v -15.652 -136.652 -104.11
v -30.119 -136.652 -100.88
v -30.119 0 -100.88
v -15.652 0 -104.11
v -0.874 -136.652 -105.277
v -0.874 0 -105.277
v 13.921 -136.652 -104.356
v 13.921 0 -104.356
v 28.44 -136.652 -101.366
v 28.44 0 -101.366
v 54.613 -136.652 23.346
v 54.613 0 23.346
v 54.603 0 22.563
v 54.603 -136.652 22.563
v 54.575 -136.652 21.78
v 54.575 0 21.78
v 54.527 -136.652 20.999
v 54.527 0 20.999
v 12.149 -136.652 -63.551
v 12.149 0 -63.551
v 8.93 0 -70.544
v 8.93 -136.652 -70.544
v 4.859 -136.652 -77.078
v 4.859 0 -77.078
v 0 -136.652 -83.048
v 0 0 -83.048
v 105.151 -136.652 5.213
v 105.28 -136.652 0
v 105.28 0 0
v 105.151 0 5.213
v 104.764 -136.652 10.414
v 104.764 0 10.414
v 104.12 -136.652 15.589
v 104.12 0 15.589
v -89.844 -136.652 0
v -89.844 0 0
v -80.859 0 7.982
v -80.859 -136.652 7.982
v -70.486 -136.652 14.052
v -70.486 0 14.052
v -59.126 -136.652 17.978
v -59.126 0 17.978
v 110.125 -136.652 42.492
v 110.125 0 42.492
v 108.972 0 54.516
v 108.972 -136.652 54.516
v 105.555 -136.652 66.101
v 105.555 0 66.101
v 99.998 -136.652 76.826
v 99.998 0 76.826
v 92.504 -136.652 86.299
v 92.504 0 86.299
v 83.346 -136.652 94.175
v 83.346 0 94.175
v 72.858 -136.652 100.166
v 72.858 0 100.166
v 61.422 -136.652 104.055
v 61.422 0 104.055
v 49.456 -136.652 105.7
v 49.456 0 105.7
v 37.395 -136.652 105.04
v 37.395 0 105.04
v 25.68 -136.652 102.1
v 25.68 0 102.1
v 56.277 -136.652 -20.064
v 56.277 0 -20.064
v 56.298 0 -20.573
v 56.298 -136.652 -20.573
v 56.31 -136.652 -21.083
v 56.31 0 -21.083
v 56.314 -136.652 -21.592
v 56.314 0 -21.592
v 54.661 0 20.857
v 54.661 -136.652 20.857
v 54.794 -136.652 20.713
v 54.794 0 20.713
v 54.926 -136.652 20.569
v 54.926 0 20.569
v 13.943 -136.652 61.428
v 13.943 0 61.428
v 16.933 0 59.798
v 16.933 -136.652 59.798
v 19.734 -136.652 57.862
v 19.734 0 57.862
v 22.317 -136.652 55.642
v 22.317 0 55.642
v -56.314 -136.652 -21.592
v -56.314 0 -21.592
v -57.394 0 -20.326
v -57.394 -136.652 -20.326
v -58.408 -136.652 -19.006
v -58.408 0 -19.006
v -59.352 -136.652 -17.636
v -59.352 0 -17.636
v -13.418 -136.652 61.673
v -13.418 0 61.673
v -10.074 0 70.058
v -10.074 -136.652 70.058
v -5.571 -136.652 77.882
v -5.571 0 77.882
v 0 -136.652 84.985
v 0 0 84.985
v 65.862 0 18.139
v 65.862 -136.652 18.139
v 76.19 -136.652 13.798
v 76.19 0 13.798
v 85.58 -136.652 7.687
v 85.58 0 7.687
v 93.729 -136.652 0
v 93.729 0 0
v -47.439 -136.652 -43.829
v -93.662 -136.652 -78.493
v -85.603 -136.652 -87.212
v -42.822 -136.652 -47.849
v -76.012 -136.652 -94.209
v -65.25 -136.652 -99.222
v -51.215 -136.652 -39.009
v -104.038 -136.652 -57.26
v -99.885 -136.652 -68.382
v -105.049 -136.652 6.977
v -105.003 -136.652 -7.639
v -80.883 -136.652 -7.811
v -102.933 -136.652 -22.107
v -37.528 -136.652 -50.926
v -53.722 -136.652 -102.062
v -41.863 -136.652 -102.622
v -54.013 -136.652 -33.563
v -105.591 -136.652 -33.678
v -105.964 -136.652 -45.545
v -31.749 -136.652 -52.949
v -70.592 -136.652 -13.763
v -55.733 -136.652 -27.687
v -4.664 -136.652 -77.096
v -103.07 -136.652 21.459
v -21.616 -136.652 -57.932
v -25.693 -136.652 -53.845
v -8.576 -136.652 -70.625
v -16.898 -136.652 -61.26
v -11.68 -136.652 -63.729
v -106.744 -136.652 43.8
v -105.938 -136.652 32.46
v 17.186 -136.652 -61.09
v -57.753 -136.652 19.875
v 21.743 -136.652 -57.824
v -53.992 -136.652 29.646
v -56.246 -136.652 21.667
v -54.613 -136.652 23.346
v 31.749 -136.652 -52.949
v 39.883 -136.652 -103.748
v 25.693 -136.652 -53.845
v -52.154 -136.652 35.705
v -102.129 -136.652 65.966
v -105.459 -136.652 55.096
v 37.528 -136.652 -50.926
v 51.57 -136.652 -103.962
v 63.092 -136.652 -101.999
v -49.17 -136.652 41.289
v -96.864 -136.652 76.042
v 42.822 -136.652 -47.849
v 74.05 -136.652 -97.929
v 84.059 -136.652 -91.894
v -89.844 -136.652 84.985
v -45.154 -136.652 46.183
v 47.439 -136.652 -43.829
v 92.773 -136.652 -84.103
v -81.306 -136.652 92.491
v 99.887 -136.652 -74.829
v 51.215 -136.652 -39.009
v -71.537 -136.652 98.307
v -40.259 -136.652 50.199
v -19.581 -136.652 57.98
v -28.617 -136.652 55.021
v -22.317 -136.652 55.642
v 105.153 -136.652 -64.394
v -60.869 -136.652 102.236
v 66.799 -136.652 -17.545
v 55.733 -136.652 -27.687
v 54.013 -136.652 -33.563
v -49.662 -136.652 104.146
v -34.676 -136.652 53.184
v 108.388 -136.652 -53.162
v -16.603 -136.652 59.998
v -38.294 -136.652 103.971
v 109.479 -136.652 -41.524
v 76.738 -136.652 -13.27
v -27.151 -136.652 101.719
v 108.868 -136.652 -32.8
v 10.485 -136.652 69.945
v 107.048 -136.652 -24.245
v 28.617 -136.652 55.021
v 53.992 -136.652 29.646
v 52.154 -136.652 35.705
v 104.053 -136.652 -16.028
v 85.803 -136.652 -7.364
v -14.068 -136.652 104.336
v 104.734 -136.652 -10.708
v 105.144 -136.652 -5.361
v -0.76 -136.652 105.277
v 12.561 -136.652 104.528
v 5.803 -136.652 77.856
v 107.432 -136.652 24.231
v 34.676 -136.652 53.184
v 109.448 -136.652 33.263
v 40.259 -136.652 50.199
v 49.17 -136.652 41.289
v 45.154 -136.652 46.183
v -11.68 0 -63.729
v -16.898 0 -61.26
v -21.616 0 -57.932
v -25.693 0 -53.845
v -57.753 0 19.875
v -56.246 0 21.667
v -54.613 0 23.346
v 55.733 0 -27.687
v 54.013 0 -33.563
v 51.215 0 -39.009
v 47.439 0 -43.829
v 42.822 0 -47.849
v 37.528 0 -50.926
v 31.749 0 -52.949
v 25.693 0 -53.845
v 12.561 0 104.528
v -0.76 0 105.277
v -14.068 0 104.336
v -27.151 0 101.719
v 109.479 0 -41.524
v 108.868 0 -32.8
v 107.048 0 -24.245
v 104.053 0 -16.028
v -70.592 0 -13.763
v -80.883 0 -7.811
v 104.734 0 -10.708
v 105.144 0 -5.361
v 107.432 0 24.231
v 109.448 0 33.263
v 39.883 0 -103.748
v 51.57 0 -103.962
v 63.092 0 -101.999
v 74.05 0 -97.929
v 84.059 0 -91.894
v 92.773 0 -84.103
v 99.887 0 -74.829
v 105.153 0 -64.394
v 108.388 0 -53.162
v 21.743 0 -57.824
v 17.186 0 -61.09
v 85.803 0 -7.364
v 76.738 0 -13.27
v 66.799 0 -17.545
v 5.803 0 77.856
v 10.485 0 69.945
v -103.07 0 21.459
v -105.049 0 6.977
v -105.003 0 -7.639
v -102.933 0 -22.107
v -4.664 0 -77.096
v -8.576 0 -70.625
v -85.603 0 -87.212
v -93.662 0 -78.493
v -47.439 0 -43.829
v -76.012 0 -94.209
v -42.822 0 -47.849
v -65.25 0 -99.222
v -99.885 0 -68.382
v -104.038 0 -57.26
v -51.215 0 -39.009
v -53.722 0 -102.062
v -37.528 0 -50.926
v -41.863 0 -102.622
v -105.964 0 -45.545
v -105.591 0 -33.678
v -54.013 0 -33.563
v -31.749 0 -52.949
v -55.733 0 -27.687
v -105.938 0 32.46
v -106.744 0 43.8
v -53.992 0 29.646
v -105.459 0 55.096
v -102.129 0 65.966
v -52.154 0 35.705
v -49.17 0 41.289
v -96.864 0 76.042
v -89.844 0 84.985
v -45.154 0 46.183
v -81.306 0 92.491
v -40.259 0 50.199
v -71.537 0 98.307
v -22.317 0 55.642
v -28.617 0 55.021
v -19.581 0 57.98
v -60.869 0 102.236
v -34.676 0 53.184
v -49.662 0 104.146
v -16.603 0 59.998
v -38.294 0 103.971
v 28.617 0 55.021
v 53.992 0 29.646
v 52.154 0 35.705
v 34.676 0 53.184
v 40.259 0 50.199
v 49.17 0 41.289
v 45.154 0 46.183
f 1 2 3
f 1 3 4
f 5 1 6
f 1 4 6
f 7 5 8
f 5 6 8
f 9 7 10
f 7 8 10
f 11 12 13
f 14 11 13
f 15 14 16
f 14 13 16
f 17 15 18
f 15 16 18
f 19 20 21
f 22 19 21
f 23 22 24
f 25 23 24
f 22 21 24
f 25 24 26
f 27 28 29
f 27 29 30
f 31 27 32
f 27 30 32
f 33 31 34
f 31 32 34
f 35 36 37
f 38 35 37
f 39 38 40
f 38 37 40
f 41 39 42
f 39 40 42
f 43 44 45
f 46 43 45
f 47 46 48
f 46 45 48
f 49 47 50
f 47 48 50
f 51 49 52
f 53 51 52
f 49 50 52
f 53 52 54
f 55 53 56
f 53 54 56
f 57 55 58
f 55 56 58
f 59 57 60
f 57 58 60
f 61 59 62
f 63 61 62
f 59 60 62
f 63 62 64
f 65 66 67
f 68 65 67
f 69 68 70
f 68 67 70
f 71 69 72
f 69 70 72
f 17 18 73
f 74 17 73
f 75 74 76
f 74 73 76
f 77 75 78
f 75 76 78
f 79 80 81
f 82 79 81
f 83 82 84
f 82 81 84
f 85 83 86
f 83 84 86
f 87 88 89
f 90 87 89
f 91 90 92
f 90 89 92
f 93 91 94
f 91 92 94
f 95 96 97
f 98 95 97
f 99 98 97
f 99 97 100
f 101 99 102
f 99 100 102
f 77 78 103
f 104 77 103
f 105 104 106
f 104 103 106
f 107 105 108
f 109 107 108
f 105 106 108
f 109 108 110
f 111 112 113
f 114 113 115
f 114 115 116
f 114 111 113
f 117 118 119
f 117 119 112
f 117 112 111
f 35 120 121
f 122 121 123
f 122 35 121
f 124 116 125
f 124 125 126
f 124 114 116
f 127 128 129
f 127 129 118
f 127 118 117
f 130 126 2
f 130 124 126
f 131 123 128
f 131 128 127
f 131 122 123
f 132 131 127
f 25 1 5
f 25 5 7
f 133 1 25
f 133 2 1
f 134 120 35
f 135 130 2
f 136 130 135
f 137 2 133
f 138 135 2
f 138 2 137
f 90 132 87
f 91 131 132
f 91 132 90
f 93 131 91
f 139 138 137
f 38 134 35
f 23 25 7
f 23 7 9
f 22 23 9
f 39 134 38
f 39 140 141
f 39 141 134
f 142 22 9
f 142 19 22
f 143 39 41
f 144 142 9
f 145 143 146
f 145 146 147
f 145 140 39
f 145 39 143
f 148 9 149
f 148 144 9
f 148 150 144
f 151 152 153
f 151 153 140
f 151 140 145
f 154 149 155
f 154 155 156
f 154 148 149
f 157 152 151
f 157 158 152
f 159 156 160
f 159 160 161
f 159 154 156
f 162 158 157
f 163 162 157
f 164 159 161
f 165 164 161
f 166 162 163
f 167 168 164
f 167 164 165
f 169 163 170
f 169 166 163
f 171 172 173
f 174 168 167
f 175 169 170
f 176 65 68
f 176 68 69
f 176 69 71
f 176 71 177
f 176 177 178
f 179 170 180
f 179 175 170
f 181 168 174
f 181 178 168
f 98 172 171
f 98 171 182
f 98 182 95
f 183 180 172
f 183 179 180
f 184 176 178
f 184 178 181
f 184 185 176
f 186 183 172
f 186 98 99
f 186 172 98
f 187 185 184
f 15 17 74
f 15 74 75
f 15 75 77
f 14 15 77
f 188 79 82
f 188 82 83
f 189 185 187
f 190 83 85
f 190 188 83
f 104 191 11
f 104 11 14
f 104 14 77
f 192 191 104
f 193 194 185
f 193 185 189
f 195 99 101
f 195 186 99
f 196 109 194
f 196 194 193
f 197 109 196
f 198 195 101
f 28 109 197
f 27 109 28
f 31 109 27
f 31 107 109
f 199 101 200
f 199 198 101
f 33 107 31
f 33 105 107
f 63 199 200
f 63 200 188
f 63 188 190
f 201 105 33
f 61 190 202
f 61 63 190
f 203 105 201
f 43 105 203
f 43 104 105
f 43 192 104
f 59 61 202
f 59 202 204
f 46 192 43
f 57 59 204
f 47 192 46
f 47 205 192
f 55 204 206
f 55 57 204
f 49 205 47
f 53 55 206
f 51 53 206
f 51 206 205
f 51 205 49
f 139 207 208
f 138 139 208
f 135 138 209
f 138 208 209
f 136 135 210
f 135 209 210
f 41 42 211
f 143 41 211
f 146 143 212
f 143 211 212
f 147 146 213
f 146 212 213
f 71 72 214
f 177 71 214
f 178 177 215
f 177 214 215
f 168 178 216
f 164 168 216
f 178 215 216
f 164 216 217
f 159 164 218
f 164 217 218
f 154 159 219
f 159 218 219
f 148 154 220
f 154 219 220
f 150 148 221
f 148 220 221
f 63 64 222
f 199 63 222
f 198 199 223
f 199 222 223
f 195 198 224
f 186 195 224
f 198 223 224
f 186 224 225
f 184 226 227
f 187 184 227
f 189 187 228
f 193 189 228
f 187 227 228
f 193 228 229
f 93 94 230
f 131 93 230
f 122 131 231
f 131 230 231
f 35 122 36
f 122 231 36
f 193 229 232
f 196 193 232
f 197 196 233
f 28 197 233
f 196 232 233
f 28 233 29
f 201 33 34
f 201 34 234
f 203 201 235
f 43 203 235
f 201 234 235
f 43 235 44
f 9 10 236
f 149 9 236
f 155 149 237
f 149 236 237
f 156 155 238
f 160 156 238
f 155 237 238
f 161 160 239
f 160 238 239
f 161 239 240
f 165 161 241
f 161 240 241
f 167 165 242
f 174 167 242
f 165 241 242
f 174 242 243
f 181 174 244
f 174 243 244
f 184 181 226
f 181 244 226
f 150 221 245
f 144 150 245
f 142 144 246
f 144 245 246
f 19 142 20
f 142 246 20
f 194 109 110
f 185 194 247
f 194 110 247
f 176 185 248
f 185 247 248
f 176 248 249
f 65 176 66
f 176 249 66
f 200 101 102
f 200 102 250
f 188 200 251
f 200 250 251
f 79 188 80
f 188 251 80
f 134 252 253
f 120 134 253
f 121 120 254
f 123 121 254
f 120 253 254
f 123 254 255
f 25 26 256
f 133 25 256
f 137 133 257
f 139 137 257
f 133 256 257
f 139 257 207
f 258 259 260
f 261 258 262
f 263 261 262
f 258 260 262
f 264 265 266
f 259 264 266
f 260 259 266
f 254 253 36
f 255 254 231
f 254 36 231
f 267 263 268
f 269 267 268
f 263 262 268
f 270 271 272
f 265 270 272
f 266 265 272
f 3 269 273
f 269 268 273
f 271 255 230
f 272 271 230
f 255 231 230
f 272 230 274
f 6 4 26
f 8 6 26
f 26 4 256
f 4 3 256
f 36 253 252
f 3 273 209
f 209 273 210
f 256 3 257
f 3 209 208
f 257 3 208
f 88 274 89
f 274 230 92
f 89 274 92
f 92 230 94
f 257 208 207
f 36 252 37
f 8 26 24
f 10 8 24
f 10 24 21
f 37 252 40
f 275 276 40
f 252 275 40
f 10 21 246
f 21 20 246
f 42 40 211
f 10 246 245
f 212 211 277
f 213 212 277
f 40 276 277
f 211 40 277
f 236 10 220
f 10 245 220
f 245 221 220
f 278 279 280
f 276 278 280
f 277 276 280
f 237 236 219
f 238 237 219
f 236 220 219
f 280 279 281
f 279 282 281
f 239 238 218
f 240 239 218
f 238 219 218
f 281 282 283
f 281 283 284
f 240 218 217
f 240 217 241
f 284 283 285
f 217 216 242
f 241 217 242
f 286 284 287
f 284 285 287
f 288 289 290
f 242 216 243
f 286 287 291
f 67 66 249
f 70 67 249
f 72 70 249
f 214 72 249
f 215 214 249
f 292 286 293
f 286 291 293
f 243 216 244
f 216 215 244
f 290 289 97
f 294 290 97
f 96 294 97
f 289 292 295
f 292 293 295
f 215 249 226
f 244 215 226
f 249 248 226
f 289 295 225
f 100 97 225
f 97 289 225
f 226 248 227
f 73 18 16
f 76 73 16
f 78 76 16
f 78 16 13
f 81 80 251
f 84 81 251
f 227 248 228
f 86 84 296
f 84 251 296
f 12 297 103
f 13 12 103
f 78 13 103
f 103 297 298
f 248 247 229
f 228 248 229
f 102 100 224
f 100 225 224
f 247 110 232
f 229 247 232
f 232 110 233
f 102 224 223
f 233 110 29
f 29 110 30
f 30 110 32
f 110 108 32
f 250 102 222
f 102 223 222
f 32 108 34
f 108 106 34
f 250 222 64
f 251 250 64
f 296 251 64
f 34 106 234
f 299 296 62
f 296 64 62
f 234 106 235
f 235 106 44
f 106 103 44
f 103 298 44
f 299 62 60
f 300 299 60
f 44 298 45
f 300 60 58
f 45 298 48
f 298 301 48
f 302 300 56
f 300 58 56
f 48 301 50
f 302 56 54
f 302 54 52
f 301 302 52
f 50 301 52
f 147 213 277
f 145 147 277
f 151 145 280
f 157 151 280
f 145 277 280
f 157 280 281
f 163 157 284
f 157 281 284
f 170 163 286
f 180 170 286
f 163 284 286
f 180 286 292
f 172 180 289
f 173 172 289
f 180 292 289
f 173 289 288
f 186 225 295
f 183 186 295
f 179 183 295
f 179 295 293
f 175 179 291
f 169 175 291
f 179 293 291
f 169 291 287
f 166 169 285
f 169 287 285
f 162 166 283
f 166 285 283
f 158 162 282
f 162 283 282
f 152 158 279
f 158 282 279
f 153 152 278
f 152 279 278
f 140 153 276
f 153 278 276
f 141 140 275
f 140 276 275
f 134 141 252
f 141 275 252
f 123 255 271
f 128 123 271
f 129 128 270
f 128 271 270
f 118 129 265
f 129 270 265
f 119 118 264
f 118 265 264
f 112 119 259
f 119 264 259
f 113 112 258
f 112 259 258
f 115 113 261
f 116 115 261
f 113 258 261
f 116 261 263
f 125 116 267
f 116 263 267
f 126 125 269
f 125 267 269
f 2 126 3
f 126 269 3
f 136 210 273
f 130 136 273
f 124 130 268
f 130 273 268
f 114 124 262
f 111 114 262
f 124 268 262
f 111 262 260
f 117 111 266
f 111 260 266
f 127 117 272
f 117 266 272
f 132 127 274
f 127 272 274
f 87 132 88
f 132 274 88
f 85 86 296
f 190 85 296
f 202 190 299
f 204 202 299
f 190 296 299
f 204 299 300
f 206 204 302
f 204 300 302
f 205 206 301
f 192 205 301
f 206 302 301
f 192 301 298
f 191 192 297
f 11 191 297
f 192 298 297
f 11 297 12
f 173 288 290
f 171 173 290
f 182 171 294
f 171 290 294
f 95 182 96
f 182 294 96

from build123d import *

# Parameters (mm, degrees)
F1_DEPTH = 136.652


with BuildPart() as f1:
    # F0 (on Front) → F1 (new body)
    with BuildSketch(Plane.XZ):
        with BuildLine():
            ThreePointArc((54.527499783, 20.9989734618), (54.7276679048, 20.7850152309), (54.9257769328, 20.5691490349))
            ThreePointArc((54.9257769328, 20.5691490349), (76.1901987299, 13.7983190429), (93.7294736505, 0))
            ThreePointArc((93.7294736505, 0), (99.5048519531, 7.4078439529), (104.1196596047, 15.589206731))
            ThreePointArc((104.1196596047, 15.589206731), (77.9936820742, 70.717129744), (25.6797344721, 102.1003335947))
            ThreePointArc((25.6797344721, 102.1003335947), (11.7801687474, 95.1325271586), (0, 84.9848240614))
            ThreePointArc((0, 84.9848240614), (8.2911620822, 73.9876177792), (13.9425107784, 61.4279930793))
            ThreePointArc((13.9425107784, 61.4279930793), (18.3589234819, 58.8669445911), (22.3165845225, 55.6419500772))
            ThreePointArc((22.3165845225, 55.6419500772), (45.1535066394, 46.1825872135), (54.6128695031, 23.3456650966))
            ThreePointArc((54.6128695031, 23.3456650966), (54.5915200165, 22.1715431248), (54.527499783, 20.9989734618))
        make_face()
        with BuildLine():
            ThreePointArc((93.7294736505, 0), (76.7382859544, -13.2702968374), (56.2774381887, -20.0640400021))
            ThreePointArc((56.2774381887, -20.0640400021), (56.3045635593, -20.8278500085), (56.3136070377, -21.5920880129))
            ThreePointArc((56.3136070377, -21.5920880129), (47.4391029946, -43.8287739455), (25.6927352215, -53.8448865624))
            ThreePointArc((25.6927352215, -53.8448865624), (19.5331456536, -59.5527538305), (12.1485373896, -63.5512351899))
            ThreePointArc((12.1485373896, -63.5512351899), (6.9976805403, -73.8751515766), (0, -83.0483213067))
            ThreePointArc((0, -83.0483213067), (12.9593131443, -94.1642757812), (28.4396211824, -101.3662410752))
            ThreePointArc((28.4396211824, -101.3662410752), (78.7986877851, -69.8190066246), (104.0530293111, -16.027912337))
            ThreePointArc((104.0530293111, -16.027912337), (99.5048519531, -7.6187369724), (93.7294736505, 0))
        make_face()
        with BuildLine():
            ThreePointArc((104.1196596047, 15.589206731), (99.5048519531, 7.4078439529), (93.7294736505, 0))
            ThreePointArc((93.7294736505, 0), (99.5048519531, -7.6187369724), (104.0530293111, -16.027912337))
            ThreePointArc((104.0530293111, -16.027912337), (104.9729816843, -8.0374124574), (105.2802302558, 0))
            ThreePointArc((105.2802302558, 0), (104.9896866841, 7.816173788), (104.1196596047, 15.589206731))
        make_face()
        with BuildLine():
            ThreePointArc((109.4791079844, -41.5241606534), (108.1075668029, -28.4905405885), (104.0530293111, -16.027912337))
            ThreePointArc((104.0530293111, -16.027912337), (78.7986877851, -69.8190066246), (28.4396211824, -101.3662410752))
            ThreePointArc((28.4396211824, -101.3662410752), (84.0593765341, -91.8939755487), (109.4791079844, -41.5241606534))
        make_face()
        with BuildLine():
            ThreePointArc((25.6797344721, 102.1003335947), (77.9936820742, 70.717129744), (104.1196596047, 15.589206731))
            ThreePointArc((104.1196596047, 15.589206731), (108.6056945653, 28.7097136295), (110.1253773364, 42.4924120307))
            ThreePointArc((110.1253773364, 42.4924120307), (83.3457717598, 94.174543643), (25.6797344721, 102.1003335947))
        make_face()
        with BuildLine():
            ThreePointArc((-56.3136070377, -21.5920880129), (-57.9095553347, -19.6725800372), (-59.3524805988, -17.6355408825))
            ThreePointArc((-59.3524805988, -17.6355408825), (-75.8807124036, -11.0348961584), (-89.8443087935, 0))
            ThreePointArc((-89.8443087935, 0), (-97.5622695247, -10.3588890688), (-102.9329187465, -22.1074901568))
            ThreePointArc((-102.9329187465, -22.1074901568), (-77.3108882291, -71.4629515478), (-30.118879838, -100.8800275576))
            ThreePointArc((-30.118879838, -100.8800275576), (-13.7568828123, -94.1642757812), (0, -83.0483213067))
            ThreePointArc((0, -83.0483213067), (-6.7178829074, -73.9195667822), (-11.6800359007, -63.7293191111))
            ThreePointArc((-11.6800359007, -63.7293191111), (-19.3289034102, -59.6979704443), (-25.6927352215, -53.8448865624))
            ThreePointArc((-25.6927352215, -53.8448865624), (-47.4391029946, -43.8287739455), (-56.3136070377, -21.5920880129))
        make_face()
        with BuildLine():
            ThreePointArc((-30.118879838, -100.8800275576), (-0.874115727, -105.2766014098), (28.4396211824, -101.3662410752))
            ThreePointArc((28.4396211824, -101.3662410752), (12.9593131443, -94.1642757812), (0, -83.0483213067))
            ThreePointArc((0, -83.0483213067), (-13.7568828123, -94.1642757812), (-30.118879838, -100.8800275576))
        make_face()
        with BuildLine():
            ThreePointArc((0, 84.9848240614), (11.7801687474, 95.1325271586), (25.6797344721, 102.1003335947))
            ThreePointArc((25.6797344721, 102.1003335947), (-0.7599031291, 105.2774877642), (-27.1509221895, 101.7189967851))
            ThreePointArc((-27.1509221895, 101.7189967851), (-12.4779975244, 95.1325271586), (0, 84.9848240614))
        make_face()
        with BuildLine():
            ThreePointArc((-102.9329187465, -22.1074901568), (-97.5622695247, -10.3588890688), (-89.8443087935, 0))
            ThreePointArc((-89.8443087935, 0), (-97.5622695247, 10.0482551584), (-103.0701310001, 21.4586807219))
            ThreePointArc((-103.0701310001, 21.4586807219), (-105.2797080994, -0.3315798868), (-102.9329187465, -22.1074901568))
        make_face()
        with BuildLine():
            ThreePointArc((-103.0701310001, 21.4586807219), (-97.5622695247, 10.0482551584), (-89.8443087935, 0))
            ThreePointArc((-89.8443087935, 0), (-75.8216360442, 11.2724103293), (-59.1261791661, 17.977953208))
            ThreePointArc((-59.1261791661, 17.977953208), (-57.0156534005, 20.7846782143), (-54.6128695031, 23.3456650966))
            ThreePointArc((-54.6128695031, 23.3456650966), (-45.1535066394, 46.1825872135), (-22.3165845225, 55.6419500772))
            ThreePointArc((-22.3165845225, 55.6419500772), (-18.1199759802, 59.0304671081), (-13.4179508285, 61.6732933224))
            ThreePointArc((-13.4179508285, 61.6732933224), (-7.9622593488, 74.0504399858), (0, 84.9848240614))
            ThreePointArc((0, 84.9848240614), (-12.4779975244, 95.1325271586), (-27.1509221895, 101.7189967851))
            ThreePointArc((-27.1509221895, 101.7189967851), (-76.4840523057, 72.3471950086), (-103.0701310001, 21.4586807219))
        make_face()
        with BuildLine():
            ThreePointArc((-102.9329187465, -22.1074901568), (-89.8443087935, -83.0483213067), (-30.118879838, -100.8800275576))
            ThreePointArc((-30.118879838, -100.8800275576), (-77.3108882291, -71.4629515478), (-102.9329187465, -22.1074901568))
        make_face()
        with BuildLine():
            ThreePointArc((-103.0701310001, 21.4586807219), (-76.4840523057, 72.3471950086), (-27.1509221895, 101.7189967851))
            ThreePointArc((-27.1509221895, 101.7189967851), (-89.8443087935, 84.9848240614), (-103.0701310001, 21.4586807219))
        make_face()
    extrude(amount=F1_DEPTH)


solid = f1.part
